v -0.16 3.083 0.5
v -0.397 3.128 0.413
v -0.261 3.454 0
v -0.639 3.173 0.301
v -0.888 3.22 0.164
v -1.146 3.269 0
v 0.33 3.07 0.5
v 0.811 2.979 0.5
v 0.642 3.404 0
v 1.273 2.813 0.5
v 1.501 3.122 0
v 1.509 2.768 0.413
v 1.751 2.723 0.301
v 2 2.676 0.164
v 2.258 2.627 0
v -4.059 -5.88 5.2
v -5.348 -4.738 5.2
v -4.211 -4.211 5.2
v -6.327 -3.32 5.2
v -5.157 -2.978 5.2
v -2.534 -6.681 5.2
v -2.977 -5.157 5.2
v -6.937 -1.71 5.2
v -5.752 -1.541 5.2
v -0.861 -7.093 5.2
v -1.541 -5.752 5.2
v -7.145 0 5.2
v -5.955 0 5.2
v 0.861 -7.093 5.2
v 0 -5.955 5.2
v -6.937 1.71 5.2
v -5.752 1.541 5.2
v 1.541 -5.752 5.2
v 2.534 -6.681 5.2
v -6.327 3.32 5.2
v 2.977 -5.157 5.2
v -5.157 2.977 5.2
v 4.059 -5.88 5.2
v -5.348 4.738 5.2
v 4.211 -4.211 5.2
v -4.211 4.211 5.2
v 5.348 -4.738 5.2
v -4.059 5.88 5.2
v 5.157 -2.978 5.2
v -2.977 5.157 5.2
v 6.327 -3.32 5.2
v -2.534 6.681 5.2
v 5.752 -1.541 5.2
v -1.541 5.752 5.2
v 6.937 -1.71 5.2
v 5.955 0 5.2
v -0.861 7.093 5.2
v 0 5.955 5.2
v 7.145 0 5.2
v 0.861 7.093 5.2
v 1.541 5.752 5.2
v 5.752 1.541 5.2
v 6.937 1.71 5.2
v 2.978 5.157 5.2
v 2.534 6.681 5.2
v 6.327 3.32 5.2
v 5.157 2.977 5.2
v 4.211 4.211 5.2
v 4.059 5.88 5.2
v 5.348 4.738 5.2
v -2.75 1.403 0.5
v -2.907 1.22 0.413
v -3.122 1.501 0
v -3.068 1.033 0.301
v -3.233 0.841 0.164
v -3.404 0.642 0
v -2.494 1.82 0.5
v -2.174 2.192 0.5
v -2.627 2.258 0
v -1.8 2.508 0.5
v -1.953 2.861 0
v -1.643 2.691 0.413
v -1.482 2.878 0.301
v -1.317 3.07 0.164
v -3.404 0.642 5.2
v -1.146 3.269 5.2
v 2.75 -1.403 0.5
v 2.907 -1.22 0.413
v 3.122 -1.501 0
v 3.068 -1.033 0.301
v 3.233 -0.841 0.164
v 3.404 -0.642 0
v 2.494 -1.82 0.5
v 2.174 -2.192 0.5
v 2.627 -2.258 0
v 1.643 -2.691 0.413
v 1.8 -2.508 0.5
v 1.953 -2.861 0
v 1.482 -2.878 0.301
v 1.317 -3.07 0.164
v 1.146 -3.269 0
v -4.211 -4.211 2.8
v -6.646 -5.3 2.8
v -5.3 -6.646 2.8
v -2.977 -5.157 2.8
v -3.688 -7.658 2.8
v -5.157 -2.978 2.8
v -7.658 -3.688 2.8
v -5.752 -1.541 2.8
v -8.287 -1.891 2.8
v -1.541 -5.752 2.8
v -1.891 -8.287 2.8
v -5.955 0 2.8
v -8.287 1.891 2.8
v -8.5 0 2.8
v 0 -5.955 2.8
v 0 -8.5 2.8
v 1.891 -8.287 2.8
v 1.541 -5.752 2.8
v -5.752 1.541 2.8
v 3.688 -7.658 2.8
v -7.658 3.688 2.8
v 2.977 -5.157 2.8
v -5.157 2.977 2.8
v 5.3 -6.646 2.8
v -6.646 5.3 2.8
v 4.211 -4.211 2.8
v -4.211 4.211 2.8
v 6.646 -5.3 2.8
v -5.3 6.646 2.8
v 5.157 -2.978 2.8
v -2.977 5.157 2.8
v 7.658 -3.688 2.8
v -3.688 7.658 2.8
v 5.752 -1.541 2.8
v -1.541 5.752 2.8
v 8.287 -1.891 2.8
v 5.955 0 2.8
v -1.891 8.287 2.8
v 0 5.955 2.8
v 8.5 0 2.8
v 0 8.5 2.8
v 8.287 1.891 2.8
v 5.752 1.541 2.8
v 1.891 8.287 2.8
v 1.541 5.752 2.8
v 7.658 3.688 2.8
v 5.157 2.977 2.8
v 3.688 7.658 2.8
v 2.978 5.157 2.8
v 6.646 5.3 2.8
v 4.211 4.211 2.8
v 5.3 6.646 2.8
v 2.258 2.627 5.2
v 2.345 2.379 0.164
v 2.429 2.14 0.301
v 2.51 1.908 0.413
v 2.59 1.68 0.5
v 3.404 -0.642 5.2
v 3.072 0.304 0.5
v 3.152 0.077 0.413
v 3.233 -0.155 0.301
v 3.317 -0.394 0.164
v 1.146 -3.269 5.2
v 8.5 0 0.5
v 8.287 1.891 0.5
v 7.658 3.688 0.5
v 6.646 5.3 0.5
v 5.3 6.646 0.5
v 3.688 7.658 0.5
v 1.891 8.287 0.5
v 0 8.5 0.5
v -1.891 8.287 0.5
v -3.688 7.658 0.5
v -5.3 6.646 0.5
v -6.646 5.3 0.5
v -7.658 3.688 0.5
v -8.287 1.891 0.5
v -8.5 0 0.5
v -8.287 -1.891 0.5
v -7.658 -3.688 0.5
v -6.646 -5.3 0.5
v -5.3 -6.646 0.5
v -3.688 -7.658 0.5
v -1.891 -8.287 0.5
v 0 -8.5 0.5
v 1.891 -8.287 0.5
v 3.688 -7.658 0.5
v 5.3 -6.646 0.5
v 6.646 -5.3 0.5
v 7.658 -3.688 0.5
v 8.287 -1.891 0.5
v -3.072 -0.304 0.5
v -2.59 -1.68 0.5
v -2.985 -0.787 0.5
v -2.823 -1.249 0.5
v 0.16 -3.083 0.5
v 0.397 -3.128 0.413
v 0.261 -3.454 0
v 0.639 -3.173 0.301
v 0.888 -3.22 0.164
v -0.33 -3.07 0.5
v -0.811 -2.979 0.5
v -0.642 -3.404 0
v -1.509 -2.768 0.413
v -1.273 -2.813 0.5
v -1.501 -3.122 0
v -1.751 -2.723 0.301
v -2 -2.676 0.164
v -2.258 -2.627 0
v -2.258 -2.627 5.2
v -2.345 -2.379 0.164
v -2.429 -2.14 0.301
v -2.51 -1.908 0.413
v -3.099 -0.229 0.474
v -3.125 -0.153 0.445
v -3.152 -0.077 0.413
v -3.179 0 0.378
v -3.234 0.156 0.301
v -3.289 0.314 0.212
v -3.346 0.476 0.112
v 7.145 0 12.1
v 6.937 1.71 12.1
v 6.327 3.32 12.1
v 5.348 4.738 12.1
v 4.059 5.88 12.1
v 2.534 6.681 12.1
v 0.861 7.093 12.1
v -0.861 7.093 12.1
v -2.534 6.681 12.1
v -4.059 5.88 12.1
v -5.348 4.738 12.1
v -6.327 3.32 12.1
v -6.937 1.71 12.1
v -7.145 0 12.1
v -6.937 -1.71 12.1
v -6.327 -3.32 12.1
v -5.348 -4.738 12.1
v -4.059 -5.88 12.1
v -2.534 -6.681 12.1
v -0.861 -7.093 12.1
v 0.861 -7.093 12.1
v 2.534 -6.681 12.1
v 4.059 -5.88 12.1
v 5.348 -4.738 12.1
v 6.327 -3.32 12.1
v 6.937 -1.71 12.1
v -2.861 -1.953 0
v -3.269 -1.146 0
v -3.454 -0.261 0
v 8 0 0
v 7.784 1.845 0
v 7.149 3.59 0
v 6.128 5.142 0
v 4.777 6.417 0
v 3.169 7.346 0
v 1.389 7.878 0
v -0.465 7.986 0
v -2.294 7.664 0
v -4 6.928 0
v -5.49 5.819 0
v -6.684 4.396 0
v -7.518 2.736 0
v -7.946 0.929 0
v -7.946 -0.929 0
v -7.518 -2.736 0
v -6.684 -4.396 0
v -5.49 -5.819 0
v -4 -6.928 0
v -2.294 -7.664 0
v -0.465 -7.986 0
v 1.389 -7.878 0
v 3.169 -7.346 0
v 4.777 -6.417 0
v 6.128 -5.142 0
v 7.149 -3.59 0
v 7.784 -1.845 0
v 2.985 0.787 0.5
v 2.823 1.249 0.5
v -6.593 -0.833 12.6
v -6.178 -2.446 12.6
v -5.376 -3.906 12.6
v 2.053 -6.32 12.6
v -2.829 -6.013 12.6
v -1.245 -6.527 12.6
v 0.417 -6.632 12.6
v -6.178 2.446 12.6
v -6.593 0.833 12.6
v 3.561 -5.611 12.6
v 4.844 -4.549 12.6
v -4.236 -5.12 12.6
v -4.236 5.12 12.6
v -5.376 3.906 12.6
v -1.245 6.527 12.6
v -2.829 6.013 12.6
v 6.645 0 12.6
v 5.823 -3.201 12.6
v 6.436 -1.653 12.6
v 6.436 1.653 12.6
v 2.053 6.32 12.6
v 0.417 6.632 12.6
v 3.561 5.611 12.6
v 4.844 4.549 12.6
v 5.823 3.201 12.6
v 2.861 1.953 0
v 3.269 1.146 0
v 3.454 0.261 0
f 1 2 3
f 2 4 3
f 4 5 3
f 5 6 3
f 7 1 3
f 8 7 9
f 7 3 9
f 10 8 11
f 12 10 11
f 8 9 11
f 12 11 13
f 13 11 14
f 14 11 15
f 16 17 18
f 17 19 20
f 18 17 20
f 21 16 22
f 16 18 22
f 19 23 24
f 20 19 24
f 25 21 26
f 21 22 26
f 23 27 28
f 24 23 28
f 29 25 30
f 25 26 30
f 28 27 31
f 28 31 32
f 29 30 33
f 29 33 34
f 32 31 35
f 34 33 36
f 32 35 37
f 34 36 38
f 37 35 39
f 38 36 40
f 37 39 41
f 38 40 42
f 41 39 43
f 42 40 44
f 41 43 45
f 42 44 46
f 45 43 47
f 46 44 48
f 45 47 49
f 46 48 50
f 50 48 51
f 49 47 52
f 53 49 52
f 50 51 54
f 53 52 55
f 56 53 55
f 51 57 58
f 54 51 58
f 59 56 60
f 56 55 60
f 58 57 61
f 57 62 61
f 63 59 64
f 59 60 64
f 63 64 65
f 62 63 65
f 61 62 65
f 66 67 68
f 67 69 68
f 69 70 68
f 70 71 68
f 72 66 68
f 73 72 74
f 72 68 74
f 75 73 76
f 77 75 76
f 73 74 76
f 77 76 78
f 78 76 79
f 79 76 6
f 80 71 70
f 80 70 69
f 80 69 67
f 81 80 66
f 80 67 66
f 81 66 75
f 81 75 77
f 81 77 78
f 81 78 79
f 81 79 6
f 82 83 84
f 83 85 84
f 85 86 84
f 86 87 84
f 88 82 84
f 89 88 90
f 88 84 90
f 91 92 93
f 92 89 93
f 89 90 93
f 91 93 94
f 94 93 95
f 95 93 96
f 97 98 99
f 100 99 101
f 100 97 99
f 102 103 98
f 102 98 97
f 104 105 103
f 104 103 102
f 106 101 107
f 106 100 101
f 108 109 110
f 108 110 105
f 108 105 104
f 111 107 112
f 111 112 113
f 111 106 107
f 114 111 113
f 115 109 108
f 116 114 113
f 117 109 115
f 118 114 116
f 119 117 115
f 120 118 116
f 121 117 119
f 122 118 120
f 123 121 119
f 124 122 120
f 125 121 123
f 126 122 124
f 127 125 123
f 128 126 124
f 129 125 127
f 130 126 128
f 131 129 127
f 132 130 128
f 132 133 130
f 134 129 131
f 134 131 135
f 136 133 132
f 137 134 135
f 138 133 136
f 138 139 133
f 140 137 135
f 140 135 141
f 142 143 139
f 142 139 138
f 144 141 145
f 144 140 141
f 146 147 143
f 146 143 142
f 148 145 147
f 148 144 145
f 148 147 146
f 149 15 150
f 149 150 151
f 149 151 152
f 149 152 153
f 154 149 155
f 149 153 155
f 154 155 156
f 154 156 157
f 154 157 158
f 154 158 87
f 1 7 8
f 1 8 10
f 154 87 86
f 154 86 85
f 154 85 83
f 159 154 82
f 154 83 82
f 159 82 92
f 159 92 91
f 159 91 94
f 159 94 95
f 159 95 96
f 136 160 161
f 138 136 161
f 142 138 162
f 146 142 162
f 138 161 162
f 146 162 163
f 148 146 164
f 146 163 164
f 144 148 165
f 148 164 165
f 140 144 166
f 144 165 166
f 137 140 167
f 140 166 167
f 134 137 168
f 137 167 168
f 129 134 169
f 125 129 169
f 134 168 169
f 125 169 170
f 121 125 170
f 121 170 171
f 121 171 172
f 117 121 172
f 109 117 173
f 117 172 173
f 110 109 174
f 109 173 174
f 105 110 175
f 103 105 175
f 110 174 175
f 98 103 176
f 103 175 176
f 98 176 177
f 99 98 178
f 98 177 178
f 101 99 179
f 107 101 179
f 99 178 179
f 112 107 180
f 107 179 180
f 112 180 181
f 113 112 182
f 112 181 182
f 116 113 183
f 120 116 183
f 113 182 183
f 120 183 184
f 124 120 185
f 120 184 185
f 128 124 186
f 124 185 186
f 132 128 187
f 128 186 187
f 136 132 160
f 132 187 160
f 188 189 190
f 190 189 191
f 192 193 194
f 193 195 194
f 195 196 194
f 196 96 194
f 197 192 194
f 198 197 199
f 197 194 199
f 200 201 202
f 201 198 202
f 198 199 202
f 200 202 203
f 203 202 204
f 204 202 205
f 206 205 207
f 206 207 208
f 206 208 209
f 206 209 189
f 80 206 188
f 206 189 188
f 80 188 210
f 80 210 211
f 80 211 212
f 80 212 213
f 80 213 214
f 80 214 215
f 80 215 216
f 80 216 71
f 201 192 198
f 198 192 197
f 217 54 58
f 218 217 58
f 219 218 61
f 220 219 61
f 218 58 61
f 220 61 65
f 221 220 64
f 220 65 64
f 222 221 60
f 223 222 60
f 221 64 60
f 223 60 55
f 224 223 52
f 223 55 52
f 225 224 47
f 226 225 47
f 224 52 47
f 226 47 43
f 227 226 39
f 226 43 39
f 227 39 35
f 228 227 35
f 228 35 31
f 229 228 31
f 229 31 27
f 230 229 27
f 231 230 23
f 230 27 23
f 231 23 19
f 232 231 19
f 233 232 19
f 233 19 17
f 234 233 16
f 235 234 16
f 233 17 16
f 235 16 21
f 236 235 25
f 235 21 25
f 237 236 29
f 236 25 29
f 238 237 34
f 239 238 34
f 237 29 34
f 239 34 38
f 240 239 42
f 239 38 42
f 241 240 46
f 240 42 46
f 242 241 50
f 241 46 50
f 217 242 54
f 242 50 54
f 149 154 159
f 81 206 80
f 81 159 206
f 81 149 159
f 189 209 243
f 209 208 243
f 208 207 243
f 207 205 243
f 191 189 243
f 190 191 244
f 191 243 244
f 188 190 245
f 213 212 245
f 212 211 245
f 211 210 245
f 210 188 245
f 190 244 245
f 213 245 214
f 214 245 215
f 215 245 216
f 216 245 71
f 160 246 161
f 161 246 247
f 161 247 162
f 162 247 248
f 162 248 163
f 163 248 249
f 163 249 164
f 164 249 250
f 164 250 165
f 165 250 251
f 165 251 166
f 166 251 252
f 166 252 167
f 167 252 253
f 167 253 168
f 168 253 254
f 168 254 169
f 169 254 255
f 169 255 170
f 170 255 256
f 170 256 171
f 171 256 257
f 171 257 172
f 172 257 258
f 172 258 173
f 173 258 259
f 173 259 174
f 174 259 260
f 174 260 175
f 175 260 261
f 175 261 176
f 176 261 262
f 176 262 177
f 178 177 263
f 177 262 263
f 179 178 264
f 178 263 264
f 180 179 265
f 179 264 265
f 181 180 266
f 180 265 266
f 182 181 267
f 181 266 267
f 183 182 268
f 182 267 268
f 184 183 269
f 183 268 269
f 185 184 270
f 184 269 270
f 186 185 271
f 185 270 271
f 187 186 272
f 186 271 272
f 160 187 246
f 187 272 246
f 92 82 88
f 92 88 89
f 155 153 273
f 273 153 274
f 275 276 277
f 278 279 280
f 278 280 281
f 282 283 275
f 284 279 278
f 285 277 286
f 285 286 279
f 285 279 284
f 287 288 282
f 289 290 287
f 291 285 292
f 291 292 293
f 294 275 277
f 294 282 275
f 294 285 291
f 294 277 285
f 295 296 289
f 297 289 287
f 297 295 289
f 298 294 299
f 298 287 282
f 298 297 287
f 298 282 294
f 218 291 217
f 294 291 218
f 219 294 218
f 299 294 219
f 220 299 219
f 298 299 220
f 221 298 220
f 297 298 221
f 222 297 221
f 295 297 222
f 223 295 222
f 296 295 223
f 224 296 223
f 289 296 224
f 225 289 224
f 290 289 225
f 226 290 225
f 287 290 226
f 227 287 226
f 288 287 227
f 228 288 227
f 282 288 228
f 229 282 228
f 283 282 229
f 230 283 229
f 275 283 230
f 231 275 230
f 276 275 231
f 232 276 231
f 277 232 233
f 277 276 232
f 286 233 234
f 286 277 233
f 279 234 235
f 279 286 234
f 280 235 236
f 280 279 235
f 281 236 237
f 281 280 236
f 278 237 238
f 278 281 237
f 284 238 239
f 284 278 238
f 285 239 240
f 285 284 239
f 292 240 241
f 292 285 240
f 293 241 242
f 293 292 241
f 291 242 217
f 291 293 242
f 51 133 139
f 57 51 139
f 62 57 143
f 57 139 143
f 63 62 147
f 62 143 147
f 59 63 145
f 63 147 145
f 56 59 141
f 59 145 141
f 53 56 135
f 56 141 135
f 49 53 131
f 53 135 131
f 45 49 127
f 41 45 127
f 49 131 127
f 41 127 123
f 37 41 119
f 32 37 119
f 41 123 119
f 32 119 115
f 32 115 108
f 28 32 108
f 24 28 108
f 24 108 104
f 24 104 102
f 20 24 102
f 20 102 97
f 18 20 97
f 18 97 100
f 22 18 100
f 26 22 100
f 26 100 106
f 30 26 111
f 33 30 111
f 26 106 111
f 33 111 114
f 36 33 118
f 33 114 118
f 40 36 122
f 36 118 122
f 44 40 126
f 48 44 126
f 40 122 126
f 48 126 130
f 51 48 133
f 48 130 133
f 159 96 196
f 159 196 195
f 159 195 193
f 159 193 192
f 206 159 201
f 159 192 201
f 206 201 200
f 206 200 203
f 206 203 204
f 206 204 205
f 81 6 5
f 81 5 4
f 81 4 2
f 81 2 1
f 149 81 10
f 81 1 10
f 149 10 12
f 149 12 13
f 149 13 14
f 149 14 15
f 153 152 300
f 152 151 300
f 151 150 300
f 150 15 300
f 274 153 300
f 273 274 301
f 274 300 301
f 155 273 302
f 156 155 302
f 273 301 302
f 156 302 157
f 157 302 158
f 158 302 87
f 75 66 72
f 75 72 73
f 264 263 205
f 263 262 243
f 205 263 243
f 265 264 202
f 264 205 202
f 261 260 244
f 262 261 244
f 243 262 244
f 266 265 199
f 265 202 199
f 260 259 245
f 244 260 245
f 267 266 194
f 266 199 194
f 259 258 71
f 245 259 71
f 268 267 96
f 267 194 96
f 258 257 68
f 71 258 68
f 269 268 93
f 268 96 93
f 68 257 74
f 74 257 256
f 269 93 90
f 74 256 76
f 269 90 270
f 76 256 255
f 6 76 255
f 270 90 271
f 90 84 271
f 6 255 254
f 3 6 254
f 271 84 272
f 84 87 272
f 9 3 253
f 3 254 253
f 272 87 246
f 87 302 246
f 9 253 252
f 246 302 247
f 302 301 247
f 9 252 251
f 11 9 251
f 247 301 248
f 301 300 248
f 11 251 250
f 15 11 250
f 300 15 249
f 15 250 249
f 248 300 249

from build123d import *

# Parameters (mm, degrees)
SKETCH_1_R          = 8.5
EXTRUDE_1_DEPTH     = 2.8
SKETCH_2_R          = 5.955
EXTRUDE_2_DEPTH     = 2.4
SKETCH_3_R          = 7.145
EXTRUDE_3_DEPTH     = 7.4
CHAMFER_1_SIZE      = 0.5
CHAMFER_2_SIZE      = 0.5
CUT_EXTRUDE_1_DEPTH = 5.2
SKETCH_5_R          = 3.464101615
CUT_EXTRUDE_2_DEPTH = 0.5
CUT_EXTRUDE_2_DRAFT = -37


with BuildPart() as part:
    # 草图1 → 拉伸1 (new body)
    with BuildSketch(Plane.XY):
        Circle(SKETCH_1_R)
    extrude(amount=EXTRUDE_1_DEPTH)

    # 草图2 → 拉伸2 (add)
    with BuildSketch(Plane.XY.offset(2.8)):
        Circle(SKETCH_2_R)
    extrude(amount=EXTRUDE_2_DEPTH)

    # 草图3 → 拉伸3 (add)
    with BuildSketch(Plane.XY.offset(5.2)):
        Circle(SKETCH_3_R)
    extrude(amount=EXTRUDE_3_DEPTH)

    # 倒角1
    chamfer_1_edges = [part.edges().sort_by_distance(p)[0] for p in [
        (-7.145, 0, 12.6),
    ]]
    chamfer(chamfer_1_edges, length=CHAMFER_1_SIZE)

    # 倒角2
    chamfer_2_edges = [part.edges().sort_by_distance(p)[0] for p in [
        (-8.5, 0, 0),
    ]]
    chamfer(chamfer_2_edges, length=CHAMFER_2_SIZE)

    # 草图4 → 切除-拉伸1 (cut)
    with BuildSketch(Plane(origin=(0, 0, 0), x_dir=(-1, 0, 0), z_dir=(0, 0, -1))):
        Polygon((2.258087232, -2.626983451), (3.40407802, 0.642069181), (1.145990788, 3.269052632), (-2.258087232, 2.626983451), (-3.40407802, -0.642069181), (-1.145990788, -3.269052632), align=None)
    extrude(amount=-CUT_EXTRUDE_1_DEPTH, mode=Mode.SUBTRACT)


with BuildPart() as cut_extrude_2_tool:
    # 草图5 → 切除-拉伸2 (with draft: the straight prism first)
    with BuildSketch(Plane(origin=(0, 0, 0), x_dir=(-1, 0, 0), z_dir=(0, 0, -1))):
        Circle(SKETCH_5_R)
    extrude(amount=-CUT_EXTRUDE_2_DEPTH)
    # 切除-拉伸2: the draft: its side faces are tilted about the plane it starts from
    cut_extrude_2_sides = [cut_extrude_2_tool.faces().sort_by_distance(p)[0] for p in [
        (3.464101615, 0, 0.25),
    ]]
    draft(cut_extrude_2_sides, Plane(origin=(0, 0, 0), x_dir=(-1, 0, 0), z_dir=(0, 0, -1)), CUT_EXTRUDE_2_DRAFT)


with BuildPart() as part_1:
    add(part.part)

    # 切除-拉伸2: cut by cut_extrude_2_tool
    add(cut_extrude_2_tool.part, mode=Mode.SUBTRACT)


solid = part_1.part
